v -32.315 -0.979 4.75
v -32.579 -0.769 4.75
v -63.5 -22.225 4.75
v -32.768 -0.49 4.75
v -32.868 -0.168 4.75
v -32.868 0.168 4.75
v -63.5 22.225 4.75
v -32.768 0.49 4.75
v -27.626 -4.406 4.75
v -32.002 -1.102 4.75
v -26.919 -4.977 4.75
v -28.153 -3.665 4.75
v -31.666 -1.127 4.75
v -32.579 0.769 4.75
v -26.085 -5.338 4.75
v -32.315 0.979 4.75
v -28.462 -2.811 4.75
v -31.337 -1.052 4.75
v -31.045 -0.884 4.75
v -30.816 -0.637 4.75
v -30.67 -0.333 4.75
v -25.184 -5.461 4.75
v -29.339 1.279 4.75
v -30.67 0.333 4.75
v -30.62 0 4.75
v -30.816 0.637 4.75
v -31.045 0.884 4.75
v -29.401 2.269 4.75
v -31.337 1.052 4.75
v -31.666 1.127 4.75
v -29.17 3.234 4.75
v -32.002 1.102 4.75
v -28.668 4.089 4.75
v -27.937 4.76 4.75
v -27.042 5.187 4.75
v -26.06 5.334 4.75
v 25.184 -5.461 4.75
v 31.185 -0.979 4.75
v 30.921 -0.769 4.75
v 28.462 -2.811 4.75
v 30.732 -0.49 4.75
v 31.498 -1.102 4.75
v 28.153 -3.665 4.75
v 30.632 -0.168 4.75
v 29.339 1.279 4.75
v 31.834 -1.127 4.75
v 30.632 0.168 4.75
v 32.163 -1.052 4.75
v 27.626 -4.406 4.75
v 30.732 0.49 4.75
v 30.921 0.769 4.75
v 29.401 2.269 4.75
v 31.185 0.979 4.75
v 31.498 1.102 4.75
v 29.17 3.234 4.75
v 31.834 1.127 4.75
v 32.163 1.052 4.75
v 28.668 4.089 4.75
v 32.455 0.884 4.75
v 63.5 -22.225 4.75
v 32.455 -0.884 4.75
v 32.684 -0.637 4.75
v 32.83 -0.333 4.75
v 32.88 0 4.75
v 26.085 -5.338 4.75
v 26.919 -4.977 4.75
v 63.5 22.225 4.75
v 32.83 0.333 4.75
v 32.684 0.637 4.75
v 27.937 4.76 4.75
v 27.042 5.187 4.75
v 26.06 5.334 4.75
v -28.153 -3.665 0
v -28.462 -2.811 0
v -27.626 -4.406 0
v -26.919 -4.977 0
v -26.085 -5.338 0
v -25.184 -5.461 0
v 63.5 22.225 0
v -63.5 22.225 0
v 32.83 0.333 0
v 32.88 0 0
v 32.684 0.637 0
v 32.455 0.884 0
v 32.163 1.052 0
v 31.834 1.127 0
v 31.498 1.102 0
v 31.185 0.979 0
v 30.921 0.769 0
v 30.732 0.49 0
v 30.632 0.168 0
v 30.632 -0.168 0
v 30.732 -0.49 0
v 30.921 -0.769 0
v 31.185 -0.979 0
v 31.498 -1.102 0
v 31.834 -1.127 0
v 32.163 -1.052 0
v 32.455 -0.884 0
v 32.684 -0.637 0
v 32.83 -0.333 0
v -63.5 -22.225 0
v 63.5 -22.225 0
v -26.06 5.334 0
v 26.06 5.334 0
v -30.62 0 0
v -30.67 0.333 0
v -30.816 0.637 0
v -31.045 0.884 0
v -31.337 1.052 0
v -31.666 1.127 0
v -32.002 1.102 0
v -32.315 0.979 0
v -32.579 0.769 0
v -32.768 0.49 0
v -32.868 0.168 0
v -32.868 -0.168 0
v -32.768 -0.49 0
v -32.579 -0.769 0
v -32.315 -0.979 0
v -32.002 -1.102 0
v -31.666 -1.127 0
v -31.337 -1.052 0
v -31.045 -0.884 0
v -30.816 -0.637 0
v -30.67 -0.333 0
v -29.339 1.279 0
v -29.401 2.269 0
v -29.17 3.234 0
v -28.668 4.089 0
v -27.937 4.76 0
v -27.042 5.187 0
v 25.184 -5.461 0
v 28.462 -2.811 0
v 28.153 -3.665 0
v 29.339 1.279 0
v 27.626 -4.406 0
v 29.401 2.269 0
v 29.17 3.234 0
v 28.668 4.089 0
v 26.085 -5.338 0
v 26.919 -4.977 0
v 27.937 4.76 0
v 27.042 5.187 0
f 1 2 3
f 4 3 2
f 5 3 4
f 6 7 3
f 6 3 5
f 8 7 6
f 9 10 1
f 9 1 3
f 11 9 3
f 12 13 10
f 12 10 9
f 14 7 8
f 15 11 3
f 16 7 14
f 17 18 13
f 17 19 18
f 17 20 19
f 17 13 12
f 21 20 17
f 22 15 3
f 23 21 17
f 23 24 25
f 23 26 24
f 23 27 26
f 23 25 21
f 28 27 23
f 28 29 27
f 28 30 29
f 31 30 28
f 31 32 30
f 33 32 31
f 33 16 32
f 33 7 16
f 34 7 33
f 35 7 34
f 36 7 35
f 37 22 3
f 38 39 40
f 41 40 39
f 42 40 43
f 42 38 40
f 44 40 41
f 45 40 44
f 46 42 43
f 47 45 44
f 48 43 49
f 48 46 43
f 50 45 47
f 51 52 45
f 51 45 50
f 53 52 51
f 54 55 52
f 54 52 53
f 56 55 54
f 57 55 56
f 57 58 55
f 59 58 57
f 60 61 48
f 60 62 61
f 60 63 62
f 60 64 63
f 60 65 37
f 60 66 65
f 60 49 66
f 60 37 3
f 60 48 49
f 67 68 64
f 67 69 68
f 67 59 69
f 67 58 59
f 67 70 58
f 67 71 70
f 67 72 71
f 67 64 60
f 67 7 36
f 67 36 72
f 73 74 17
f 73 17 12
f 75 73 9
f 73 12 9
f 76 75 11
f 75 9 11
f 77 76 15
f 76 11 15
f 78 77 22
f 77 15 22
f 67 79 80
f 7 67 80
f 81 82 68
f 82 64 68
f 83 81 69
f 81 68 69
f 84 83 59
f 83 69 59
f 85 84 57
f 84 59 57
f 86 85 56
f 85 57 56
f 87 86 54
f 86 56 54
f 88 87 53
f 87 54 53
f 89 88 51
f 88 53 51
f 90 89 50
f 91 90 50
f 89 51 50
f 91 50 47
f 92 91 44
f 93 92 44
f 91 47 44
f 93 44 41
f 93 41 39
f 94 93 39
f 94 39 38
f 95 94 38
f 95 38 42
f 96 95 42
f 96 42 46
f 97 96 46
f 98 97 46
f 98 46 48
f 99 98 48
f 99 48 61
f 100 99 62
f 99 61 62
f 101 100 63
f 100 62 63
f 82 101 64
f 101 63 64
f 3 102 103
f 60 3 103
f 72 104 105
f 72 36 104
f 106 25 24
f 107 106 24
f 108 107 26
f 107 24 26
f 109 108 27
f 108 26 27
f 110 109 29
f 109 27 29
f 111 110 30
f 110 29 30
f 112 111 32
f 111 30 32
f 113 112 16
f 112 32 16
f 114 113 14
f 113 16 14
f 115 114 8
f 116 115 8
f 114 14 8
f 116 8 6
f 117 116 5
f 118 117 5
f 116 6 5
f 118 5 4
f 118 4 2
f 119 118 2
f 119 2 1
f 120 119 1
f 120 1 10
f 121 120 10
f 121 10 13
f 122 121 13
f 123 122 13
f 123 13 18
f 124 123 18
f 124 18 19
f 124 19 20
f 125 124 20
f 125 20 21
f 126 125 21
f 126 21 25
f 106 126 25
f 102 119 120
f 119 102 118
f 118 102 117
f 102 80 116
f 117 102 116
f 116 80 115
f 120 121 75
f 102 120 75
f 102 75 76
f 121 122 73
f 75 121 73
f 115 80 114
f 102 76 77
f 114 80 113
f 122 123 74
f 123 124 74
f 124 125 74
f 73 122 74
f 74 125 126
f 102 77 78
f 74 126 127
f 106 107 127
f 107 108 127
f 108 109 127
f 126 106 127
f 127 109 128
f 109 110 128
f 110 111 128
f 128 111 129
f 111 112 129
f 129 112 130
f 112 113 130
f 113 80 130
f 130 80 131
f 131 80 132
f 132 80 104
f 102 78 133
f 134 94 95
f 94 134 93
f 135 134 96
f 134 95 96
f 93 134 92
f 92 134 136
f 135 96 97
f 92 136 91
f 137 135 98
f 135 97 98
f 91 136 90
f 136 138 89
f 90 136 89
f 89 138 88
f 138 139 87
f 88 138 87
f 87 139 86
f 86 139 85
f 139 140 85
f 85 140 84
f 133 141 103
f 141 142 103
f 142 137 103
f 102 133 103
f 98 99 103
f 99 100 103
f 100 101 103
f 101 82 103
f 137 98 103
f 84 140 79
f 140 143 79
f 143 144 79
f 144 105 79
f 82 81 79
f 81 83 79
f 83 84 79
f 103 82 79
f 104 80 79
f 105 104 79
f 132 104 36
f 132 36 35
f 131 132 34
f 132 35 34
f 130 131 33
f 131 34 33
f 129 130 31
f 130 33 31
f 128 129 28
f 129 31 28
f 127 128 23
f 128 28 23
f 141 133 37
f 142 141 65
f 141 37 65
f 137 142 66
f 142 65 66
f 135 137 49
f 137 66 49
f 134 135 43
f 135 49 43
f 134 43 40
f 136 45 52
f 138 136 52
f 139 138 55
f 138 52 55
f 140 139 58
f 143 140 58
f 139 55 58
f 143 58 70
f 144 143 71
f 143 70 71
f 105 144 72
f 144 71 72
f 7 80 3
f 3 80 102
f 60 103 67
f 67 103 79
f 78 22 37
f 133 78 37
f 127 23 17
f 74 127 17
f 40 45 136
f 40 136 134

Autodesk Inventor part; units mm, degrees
ref_plane "YZ Plane" through (0, 0, 0) normal (1, 0, 0) x (0, 1, 0)
ref_plane "XZ Plane" through (0, 0, 0) normal (0, 1, 0) x (-1, 0, 0)
ref_plane "XY Plane" through (0, 0, 0) normal (0, 0, 1) x (1, 0, 0)
sketch "Sketch1" plane through (0, 0, 0) normal (0, 0, 1) x (1, 0, 0)
  line L0 (-63.5, -22.225) -> (63.5, -22.225)
  line L1 (63.5, -22.225) -> (63.5, 22.225)
  line L2 (63.5, 22.225) -> (-63.5, 22.225)
  line L3 (-63.5, 22.225) -> (-63.5, -22.225)
  line L4 (-63.5, -22.225) -> (63.5, 22.225) construction
  line L5 (63.5, -22.225) -> (-63.5, 22.225) construction
  point P0 (0, 0)
  dimension "d0" = 127
  dimension "d1" = 44.45
extrude "Extrusion1" add sketch "Sketch1" along normal blind 4.7498
sketch "Sketch2" plane through (0, 0, 4.7498) normal (0, 0, 1) x (1, 0, 0)
  point P0 (0, 0)
sketch "Sketch3" plane through (0, 0, 4.7498) normal (0, 0, 1) x (1, 0, 0)
  line L0 (-63.5, -22.225) -> (63.5, -22.225) construction
  line L1 (63.5, -22.225) -> (63.5, 22.225) construction
  line L2 (63.5, 22.225) -> (-63.5, 22.225) construction
  line L3 (-63.5, 22.225) -> (-63.5, -22.225) construction
  line L4 (0, 22.225) -> (0, -22.225) construction
  circle A0 centre (-31.75, 0) radius 1.1303
  circle A1 centre (31.75, 0) radius 1.1303
  line L5 (-31.75, 0) -> (31.75, 0) construction
  line L6 (-26.0604, 5.334) -> (26.0604, 5.334)
  line L7 (-25.1841, -5.461) -> (25.1841, -5.461)
  arc A2 (29.3388, 1.2787) -> (26.0604, 5.334) centre (26.0604, 1.9812) ccw
  arc A3 (25.1841, -5.461) -> (28.4625, -2.8107) centre (25.1841, -2.1082) ccw
  arc A4 (-26.0604, 5.334) -> (-29.3388, 1.2787) centre (-26.0604, 1.9812) ccw
  line L8 (-29.3388, 1.2787) -> (-28.4625, -2.8107)
  line L9 (29.3388, 1.2787) -> (28.4625, -2.8107)
  arc A5 (-28.4625, -2.8107) -> (-25.1841, -5.461) centre (-25.1841, -2.1082) ccw
  line L10 (29.3388, 1.2787) -> (29.3388, -4.741) construction
  point P0 (0, 0)
  point P1 (0, 5.334)
  point P2 (0, -5.461)
  point P3 (-29.0648, 0)
  point P4 (-30.6197, 0)
  point P5 (-29.0648, 0)
  point P6 (-30.6197, 0)
  point P7 (-30.6197, 0)
  point P8 (-29.0648, 0)
  point P9 (29.0648, 0)
  dimension "d7" = 2.2606
  dimension "d8" = 2.2606
  dimension "d9" = 63.5
  dimension "d11" = 6.7056
  dimension "d13" = 6.7056
  dimension "d15" = 52.1208
  dimension "d16" = 50.3682
  dimension "d17" = 10.795
  dimension "d20" = 5.334
  dimension "d24" = 3.3528
  dimension "d25" = 3.3528
extrude "Extrusion2" cut sketch "Sketch3" against normal blind 4.7498
properties part number "dsub37_cutout"
